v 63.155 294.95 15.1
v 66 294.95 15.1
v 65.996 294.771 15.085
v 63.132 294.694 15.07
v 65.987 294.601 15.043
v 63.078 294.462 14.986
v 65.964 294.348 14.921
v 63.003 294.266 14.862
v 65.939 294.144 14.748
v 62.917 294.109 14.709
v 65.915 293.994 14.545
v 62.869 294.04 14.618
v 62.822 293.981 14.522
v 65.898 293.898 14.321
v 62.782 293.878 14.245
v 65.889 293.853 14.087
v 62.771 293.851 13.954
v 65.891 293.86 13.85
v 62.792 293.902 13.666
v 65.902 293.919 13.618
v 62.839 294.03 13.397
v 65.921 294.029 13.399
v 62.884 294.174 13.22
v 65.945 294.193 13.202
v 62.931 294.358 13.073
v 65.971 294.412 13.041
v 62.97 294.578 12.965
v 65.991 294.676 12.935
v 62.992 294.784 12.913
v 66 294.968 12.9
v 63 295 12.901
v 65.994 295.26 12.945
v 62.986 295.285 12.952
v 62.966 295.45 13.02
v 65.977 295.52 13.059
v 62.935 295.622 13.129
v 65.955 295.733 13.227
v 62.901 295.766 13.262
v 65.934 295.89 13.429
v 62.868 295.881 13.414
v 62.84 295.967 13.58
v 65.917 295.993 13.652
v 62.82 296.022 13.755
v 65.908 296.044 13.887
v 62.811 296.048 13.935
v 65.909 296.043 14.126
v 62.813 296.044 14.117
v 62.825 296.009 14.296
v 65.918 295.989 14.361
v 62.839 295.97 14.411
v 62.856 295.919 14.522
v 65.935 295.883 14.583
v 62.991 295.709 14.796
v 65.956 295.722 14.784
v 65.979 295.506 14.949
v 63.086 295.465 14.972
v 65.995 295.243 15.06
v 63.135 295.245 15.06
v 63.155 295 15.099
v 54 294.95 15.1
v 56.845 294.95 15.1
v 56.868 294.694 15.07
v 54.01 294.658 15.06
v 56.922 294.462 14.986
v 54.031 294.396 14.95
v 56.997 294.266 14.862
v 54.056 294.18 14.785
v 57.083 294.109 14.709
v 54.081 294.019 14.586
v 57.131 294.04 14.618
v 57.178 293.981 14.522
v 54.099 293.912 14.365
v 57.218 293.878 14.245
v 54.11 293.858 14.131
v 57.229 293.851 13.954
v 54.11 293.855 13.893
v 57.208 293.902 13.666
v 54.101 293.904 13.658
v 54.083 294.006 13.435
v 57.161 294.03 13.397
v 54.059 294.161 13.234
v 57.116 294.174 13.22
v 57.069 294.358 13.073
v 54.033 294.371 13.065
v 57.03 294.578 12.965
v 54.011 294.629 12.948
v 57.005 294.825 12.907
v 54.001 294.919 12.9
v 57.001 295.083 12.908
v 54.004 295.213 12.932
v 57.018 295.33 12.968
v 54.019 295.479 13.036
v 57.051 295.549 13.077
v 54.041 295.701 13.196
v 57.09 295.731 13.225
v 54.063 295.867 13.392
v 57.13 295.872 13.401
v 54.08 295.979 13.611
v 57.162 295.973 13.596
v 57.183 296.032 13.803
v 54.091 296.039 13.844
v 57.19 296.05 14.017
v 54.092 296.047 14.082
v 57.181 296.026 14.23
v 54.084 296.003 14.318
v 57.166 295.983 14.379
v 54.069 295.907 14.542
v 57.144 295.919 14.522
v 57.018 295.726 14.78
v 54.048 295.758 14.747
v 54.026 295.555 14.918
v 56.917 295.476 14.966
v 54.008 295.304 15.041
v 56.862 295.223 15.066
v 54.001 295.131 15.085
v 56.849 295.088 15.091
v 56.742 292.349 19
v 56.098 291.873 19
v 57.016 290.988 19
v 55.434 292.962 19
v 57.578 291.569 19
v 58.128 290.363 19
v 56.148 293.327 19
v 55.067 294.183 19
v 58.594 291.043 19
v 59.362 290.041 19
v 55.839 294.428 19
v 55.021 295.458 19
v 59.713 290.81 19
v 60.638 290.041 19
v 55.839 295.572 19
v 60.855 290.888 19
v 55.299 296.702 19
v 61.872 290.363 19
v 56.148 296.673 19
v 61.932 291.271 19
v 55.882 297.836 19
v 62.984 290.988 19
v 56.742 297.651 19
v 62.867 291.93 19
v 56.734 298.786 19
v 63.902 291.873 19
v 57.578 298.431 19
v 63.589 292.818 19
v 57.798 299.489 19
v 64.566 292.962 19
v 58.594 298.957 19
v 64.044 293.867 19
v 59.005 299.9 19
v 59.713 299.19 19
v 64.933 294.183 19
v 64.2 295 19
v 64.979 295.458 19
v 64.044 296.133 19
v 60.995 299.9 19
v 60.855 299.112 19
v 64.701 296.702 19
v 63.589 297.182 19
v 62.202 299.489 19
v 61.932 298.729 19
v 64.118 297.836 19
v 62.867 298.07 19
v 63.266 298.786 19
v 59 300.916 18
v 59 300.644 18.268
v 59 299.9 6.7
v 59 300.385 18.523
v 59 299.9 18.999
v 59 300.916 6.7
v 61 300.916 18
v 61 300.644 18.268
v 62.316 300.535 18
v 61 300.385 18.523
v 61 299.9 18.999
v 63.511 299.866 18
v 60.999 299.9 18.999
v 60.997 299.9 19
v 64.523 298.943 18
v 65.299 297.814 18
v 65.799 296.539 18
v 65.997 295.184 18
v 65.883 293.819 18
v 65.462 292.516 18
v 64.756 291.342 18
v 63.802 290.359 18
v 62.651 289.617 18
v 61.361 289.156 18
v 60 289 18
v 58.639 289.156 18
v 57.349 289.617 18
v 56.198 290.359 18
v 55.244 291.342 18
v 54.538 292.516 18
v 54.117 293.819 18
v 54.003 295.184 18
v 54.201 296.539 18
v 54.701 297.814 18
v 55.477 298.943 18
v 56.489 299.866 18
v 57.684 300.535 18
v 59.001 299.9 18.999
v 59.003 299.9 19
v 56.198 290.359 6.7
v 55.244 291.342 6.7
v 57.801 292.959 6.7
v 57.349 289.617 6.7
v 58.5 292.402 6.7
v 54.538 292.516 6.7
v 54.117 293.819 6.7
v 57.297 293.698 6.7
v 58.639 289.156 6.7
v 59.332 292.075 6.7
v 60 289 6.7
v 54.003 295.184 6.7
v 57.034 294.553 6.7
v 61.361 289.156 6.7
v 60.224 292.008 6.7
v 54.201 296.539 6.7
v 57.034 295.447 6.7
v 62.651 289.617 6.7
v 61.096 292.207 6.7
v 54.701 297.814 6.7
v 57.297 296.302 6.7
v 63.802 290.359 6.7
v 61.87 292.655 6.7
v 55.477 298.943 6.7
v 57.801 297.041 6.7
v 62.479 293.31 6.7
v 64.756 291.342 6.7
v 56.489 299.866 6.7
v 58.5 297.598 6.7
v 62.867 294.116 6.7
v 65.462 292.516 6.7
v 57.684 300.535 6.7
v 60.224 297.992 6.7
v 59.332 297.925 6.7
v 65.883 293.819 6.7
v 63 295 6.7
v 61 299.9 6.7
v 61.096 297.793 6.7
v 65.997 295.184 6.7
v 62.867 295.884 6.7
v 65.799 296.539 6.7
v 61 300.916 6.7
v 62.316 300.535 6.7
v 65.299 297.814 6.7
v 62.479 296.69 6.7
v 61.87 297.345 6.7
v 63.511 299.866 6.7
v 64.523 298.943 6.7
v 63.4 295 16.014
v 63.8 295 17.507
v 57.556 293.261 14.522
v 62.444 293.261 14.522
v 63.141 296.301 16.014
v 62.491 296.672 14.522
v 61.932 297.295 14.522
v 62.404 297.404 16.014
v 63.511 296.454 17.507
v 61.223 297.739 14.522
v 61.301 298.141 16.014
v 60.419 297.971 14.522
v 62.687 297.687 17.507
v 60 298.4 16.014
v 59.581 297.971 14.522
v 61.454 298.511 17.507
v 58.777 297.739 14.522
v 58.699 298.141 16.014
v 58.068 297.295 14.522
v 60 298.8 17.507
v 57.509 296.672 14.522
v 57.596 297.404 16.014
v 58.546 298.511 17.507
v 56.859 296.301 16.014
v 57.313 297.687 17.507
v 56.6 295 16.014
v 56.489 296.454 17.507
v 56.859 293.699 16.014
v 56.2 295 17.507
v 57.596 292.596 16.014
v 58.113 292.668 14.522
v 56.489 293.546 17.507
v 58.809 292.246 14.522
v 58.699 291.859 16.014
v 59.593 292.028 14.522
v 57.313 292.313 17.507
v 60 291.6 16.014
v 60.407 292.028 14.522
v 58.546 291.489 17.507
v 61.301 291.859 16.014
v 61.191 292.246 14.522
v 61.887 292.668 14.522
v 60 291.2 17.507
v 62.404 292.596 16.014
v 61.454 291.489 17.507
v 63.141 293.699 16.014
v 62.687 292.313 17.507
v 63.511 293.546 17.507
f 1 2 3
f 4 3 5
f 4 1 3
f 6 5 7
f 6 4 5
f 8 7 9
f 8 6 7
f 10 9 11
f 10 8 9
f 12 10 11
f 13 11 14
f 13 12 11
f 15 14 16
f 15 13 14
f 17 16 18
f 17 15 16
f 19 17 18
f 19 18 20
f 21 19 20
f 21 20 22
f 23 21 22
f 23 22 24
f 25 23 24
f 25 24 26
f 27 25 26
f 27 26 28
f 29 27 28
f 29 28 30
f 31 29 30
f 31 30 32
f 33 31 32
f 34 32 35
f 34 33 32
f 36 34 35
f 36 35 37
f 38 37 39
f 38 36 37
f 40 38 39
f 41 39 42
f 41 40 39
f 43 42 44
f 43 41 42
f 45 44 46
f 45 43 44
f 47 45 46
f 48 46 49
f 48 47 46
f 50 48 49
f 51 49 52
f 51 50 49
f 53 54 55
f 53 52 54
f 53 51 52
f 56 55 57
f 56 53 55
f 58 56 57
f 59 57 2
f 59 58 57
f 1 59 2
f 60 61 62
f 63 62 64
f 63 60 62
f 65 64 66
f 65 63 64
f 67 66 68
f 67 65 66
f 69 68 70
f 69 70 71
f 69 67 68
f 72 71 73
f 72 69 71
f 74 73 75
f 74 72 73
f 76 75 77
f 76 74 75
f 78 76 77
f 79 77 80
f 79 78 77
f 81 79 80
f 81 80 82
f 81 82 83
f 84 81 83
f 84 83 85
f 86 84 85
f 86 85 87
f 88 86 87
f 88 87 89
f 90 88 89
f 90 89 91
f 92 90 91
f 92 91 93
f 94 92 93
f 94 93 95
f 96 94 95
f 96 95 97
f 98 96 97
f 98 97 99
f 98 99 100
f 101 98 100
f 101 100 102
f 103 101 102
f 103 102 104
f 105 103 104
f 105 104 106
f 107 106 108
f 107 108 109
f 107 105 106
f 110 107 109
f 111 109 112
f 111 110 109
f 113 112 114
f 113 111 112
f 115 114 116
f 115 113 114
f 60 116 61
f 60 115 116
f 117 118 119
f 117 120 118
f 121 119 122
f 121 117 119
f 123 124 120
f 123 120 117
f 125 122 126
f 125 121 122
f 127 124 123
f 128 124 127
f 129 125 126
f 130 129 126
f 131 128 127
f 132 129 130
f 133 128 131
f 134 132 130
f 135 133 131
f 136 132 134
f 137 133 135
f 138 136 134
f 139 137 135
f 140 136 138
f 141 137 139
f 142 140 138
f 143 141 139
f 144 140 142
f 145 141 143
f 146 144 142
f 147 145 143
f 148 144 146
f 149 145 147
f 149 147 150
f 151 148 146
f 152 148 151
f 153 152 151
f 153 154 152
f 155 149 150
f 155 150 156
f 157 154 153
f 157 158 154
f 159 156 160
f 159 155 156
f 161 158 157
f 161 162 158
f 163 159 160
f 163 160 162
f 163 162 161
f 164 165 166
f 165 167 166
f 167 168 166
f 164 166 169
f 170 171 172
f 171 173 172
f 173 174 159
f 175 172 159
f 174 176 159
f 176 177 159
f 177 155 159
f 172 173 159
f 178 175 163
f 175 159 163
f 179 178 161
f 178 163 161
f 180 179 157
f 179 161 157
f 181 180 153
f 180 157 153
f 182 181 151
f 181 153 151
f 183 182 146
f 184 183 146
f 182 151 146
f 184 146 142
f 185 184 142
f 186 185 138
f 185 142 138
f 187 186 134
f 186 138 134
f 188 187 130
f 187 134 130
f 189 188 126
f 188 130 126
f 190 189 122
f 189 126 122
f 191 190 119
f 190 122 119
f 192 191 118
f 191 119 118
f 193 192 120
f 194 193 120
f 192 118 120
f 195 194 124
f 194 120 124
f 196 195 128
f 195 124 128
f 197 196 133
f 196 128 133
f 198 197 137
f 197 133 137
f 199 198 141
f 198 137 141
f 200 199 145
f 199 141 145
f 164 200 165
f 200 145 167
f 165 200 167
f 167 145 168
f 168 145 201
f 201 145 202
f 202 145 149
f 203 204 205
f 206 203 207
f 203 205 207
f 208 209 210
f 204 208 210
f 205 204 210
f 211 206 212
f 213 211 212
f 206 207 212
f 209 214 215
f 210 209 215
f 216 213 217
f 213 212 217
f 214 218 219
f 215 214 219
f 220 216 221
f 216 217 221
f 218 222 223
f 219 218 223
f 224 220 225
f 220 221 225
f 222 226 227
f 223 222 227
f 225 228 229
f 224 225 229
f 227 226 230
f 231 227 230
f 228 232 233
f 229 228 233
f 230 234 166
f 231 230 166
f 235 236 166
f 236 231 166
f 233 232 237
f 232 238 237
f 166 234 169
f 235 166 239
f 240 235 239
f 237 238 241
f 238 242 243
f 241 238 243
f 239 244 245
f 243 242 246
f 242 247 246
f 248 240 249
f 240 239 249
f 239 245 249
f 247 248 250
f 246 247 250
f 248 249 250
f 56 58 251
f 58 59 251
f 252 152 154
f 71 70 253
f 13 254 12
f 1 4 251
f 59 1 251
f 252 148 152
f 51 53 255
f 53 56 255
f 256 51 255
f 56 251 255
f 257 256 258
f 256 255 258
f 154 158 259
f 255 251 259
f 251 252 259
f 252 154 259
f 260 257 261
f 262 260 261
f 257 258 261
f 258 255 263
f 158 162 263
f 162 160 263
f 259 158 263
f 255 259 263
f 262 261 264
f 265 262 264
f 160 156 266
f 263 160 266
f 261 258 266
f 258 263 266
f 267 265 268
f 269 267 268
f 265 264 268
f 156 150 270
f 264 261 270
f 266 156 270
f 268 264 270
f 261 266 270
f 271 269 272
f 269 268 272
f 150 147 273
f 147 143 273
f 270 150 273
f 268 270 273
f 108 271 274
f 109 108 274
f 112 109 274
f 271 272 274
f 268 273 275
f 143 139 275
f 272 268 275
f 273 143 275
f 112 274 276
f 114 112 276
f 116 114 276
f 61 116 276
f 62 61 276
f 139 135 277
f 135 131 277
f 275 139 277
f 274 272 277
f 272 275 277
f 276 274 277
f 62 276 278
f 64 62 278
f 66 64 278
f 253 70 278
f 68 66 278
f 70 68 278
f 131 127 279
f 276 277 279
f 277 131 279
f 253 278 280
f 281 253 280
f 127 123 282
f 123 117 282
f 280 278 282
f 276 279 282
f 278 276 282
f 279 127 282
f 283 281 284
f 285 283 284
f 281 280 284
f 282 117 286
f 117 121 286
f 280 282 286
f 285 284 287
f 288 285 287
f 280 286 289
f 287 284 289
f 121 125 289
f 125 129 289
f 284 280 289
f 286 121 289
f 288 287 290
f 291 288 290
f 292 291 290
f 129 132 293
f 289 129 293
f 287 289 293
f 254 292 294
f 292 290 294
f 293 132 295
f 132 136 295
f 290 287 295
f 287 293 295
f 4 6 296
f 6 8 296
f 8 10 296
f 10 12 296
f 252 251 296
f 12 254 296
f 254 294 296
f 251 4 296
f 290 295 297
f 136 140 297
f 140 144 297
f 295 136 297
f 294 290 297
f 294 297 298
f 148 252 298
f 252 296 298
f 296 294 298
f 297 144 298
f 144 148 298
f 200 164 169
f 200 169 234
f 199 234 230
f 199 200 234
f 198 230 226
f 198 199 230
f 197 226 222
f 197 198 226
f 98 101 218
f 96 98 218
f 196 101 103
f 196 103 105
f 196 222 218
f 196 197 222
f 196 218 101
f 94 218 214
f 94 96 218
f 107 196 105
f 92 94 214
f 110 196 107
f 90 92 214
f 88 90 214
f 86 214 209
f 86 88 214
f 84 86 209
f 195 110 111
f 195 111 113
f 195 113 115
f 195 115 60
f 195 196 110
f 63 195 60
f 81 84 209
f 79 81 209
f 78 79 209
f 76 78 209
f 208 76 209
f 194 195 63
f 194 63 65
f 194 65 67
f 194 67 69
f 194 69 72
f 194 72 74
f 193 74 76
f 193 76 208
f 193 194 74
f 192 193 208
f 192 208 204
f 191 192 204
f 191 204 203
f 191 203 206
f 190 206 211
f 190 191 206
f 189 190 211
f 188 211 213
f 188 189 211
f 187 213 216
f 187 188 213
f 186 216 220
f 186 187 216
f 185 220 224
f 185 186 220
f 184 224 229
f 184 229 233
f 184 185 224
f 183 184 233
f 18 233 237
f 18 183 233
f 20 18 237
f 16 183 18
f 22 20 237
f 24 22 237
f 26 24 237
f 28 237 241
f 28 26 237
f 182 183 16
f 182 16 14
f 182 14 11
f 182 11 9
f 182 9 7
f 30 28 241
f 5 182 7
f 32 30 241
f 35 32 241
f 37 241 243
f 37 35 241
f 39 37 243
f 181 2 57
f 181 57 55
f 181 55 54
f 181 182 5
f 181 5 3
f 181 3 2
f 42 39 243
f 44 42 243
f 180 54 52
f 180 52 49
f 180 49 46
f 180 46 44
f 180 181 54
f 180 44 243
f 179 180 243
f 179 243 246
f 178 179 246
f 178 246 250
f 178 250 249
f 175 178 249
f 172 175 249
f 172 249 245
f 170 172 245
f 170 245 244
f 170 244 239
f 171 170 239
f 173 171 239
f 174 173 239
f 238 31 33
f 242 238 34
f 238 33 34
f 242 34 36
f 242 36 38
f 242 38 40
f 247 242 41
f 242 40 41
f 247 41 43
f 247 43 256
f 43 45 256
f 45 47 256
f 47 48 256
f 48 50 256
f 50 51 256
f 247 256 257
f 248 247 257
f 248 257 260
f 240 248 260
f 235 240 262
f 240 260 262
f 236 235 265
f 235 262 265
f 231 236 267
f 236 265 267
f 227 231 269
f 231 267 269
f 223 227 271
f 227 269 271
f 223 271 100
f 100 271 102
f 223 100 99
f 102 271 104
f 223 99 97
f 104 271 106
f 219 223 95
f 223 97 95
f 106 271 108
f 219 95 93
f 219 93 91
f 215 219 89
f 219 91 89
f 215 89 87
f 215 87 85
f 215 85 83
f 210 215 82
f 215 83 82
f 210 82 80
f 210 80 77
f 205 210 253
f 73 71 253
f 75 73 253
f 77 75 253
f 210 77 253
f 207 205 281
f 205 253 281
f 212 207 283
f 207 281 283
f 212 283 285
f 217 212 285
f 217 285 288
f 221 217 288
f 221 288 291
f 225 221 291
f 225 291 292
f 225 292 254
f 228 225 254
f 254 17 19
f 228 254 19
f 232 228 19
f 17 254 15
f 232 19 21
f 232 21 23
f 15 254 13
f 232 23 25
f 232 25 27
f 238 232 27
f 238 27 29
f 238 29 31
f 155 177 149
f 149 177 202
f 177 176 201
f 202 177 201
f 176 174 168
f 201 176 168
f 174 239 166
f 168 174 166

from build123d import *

# Parameters (mm, degrees)
SKETCH1_W      = 6
SKETCH1_H      = 12.3
EXTRUDE1_DEPTH = 309.396319693
HOLE1_D        = 6
CHAMFER1_SIZE  = 1
SKETCH5_R      = 1.1
EXTRUDE3_DEPTH = 80
SKETCH6_R      = 4.2
EXTRUDE4_DEPTH = 10
EXTRUDE4_DRAFT = -15


with BuildPart() as part:
    # Sketch1 → Revolve1 (revolve)
    with BuildSketch(Plane(origin=(0, 295, 0), x_dir=(-1, 0, 0), z_dir=(0, 1, 0))):
        with Locations((-63, 12.85)):
            Rectangle(SKETCH1_W, SKETCH1_H)
    revolve(axis=Axis((60, 295, 6.7), (0, 0, 1)))

    # Sketch2 → Extrude1 (cut, through all)
    with BuildSketch(Plane(origin=(0, 0, 6.7), x_dir=(-1, 0, 0), z_dir=(0, 0, -1))):
        with BuildLine():
            Line((-61, 300.916079783), (-61, 299.9))
            Line((-61, 299.9), (-59, 299.9))
            Line((-59, 299.9), (-59, 300.916079783))
            ThreePointArc((-59, 300.916079783), (-60, 301), (-61, 300.916079783))
        make_face()
    extrude(amount=-EXTRUDE1_DEPTH, mode=Mode.SUBTRACT)

    # Hole1 (through all)
    with Locations(Plane(origin=(0, 0, 6.7), x_dir=(-1, 0, 0), z_dir=(0, 0, -1))):
        with Locations((-60, 295)):
            Hole(HOLE1_D / 2)

    # Chamfer1
    chamfer1_edges = [part.edges().sort_by_distance(p)[0] for p in [
        (60, 289, 19),
    ]]
    chamfer(chamfer1_edges, length=CHAMFER1_SIZE)

    # Sketch5 → Extrude3 (cut)
    with BuildSketch(Plane(origin=(0, 0, 0), x_dir=(0, 0, -1), z_dir=(1, 0, 0))):
        with Locations(Location((-14, 294.95, 0), (0, 0, 180))):
            Circle(SKETCH5_R)
    extrude(amount=EXTRUDE3_DEPTH, mode=Mode.SUBTRACT)


with BuildPart() as extrude4_tool:
    # Sketch6 → Extrude4 (with draft: the straight prism first)
    with BuildSketch(Plane.XY.offset(19)):
        with Locations((60, 295)):
            Circle(SKETCH6_R)
    extrude(amount=-EXTRUDE4_DEPTH)
    # Extrude4: the draft: its side faces are tilted about the plane it starts from
    extrude4_sides = [extrude4_tool.faces().sort_by_distance(p)[0] for p in [
        (55.8, 295, 14),
    ]]
    draft(extrude4_sides, Plane.XY.offset(19), EXTRUDE4_DRAFT)


with BuildPart() as part_1:
    add(part.part)

    # Extrude4: cut by extrude4_tool
    add(extrude4_tool.part, mode=Mode.SUBTRACT)


solid = part_1.part
